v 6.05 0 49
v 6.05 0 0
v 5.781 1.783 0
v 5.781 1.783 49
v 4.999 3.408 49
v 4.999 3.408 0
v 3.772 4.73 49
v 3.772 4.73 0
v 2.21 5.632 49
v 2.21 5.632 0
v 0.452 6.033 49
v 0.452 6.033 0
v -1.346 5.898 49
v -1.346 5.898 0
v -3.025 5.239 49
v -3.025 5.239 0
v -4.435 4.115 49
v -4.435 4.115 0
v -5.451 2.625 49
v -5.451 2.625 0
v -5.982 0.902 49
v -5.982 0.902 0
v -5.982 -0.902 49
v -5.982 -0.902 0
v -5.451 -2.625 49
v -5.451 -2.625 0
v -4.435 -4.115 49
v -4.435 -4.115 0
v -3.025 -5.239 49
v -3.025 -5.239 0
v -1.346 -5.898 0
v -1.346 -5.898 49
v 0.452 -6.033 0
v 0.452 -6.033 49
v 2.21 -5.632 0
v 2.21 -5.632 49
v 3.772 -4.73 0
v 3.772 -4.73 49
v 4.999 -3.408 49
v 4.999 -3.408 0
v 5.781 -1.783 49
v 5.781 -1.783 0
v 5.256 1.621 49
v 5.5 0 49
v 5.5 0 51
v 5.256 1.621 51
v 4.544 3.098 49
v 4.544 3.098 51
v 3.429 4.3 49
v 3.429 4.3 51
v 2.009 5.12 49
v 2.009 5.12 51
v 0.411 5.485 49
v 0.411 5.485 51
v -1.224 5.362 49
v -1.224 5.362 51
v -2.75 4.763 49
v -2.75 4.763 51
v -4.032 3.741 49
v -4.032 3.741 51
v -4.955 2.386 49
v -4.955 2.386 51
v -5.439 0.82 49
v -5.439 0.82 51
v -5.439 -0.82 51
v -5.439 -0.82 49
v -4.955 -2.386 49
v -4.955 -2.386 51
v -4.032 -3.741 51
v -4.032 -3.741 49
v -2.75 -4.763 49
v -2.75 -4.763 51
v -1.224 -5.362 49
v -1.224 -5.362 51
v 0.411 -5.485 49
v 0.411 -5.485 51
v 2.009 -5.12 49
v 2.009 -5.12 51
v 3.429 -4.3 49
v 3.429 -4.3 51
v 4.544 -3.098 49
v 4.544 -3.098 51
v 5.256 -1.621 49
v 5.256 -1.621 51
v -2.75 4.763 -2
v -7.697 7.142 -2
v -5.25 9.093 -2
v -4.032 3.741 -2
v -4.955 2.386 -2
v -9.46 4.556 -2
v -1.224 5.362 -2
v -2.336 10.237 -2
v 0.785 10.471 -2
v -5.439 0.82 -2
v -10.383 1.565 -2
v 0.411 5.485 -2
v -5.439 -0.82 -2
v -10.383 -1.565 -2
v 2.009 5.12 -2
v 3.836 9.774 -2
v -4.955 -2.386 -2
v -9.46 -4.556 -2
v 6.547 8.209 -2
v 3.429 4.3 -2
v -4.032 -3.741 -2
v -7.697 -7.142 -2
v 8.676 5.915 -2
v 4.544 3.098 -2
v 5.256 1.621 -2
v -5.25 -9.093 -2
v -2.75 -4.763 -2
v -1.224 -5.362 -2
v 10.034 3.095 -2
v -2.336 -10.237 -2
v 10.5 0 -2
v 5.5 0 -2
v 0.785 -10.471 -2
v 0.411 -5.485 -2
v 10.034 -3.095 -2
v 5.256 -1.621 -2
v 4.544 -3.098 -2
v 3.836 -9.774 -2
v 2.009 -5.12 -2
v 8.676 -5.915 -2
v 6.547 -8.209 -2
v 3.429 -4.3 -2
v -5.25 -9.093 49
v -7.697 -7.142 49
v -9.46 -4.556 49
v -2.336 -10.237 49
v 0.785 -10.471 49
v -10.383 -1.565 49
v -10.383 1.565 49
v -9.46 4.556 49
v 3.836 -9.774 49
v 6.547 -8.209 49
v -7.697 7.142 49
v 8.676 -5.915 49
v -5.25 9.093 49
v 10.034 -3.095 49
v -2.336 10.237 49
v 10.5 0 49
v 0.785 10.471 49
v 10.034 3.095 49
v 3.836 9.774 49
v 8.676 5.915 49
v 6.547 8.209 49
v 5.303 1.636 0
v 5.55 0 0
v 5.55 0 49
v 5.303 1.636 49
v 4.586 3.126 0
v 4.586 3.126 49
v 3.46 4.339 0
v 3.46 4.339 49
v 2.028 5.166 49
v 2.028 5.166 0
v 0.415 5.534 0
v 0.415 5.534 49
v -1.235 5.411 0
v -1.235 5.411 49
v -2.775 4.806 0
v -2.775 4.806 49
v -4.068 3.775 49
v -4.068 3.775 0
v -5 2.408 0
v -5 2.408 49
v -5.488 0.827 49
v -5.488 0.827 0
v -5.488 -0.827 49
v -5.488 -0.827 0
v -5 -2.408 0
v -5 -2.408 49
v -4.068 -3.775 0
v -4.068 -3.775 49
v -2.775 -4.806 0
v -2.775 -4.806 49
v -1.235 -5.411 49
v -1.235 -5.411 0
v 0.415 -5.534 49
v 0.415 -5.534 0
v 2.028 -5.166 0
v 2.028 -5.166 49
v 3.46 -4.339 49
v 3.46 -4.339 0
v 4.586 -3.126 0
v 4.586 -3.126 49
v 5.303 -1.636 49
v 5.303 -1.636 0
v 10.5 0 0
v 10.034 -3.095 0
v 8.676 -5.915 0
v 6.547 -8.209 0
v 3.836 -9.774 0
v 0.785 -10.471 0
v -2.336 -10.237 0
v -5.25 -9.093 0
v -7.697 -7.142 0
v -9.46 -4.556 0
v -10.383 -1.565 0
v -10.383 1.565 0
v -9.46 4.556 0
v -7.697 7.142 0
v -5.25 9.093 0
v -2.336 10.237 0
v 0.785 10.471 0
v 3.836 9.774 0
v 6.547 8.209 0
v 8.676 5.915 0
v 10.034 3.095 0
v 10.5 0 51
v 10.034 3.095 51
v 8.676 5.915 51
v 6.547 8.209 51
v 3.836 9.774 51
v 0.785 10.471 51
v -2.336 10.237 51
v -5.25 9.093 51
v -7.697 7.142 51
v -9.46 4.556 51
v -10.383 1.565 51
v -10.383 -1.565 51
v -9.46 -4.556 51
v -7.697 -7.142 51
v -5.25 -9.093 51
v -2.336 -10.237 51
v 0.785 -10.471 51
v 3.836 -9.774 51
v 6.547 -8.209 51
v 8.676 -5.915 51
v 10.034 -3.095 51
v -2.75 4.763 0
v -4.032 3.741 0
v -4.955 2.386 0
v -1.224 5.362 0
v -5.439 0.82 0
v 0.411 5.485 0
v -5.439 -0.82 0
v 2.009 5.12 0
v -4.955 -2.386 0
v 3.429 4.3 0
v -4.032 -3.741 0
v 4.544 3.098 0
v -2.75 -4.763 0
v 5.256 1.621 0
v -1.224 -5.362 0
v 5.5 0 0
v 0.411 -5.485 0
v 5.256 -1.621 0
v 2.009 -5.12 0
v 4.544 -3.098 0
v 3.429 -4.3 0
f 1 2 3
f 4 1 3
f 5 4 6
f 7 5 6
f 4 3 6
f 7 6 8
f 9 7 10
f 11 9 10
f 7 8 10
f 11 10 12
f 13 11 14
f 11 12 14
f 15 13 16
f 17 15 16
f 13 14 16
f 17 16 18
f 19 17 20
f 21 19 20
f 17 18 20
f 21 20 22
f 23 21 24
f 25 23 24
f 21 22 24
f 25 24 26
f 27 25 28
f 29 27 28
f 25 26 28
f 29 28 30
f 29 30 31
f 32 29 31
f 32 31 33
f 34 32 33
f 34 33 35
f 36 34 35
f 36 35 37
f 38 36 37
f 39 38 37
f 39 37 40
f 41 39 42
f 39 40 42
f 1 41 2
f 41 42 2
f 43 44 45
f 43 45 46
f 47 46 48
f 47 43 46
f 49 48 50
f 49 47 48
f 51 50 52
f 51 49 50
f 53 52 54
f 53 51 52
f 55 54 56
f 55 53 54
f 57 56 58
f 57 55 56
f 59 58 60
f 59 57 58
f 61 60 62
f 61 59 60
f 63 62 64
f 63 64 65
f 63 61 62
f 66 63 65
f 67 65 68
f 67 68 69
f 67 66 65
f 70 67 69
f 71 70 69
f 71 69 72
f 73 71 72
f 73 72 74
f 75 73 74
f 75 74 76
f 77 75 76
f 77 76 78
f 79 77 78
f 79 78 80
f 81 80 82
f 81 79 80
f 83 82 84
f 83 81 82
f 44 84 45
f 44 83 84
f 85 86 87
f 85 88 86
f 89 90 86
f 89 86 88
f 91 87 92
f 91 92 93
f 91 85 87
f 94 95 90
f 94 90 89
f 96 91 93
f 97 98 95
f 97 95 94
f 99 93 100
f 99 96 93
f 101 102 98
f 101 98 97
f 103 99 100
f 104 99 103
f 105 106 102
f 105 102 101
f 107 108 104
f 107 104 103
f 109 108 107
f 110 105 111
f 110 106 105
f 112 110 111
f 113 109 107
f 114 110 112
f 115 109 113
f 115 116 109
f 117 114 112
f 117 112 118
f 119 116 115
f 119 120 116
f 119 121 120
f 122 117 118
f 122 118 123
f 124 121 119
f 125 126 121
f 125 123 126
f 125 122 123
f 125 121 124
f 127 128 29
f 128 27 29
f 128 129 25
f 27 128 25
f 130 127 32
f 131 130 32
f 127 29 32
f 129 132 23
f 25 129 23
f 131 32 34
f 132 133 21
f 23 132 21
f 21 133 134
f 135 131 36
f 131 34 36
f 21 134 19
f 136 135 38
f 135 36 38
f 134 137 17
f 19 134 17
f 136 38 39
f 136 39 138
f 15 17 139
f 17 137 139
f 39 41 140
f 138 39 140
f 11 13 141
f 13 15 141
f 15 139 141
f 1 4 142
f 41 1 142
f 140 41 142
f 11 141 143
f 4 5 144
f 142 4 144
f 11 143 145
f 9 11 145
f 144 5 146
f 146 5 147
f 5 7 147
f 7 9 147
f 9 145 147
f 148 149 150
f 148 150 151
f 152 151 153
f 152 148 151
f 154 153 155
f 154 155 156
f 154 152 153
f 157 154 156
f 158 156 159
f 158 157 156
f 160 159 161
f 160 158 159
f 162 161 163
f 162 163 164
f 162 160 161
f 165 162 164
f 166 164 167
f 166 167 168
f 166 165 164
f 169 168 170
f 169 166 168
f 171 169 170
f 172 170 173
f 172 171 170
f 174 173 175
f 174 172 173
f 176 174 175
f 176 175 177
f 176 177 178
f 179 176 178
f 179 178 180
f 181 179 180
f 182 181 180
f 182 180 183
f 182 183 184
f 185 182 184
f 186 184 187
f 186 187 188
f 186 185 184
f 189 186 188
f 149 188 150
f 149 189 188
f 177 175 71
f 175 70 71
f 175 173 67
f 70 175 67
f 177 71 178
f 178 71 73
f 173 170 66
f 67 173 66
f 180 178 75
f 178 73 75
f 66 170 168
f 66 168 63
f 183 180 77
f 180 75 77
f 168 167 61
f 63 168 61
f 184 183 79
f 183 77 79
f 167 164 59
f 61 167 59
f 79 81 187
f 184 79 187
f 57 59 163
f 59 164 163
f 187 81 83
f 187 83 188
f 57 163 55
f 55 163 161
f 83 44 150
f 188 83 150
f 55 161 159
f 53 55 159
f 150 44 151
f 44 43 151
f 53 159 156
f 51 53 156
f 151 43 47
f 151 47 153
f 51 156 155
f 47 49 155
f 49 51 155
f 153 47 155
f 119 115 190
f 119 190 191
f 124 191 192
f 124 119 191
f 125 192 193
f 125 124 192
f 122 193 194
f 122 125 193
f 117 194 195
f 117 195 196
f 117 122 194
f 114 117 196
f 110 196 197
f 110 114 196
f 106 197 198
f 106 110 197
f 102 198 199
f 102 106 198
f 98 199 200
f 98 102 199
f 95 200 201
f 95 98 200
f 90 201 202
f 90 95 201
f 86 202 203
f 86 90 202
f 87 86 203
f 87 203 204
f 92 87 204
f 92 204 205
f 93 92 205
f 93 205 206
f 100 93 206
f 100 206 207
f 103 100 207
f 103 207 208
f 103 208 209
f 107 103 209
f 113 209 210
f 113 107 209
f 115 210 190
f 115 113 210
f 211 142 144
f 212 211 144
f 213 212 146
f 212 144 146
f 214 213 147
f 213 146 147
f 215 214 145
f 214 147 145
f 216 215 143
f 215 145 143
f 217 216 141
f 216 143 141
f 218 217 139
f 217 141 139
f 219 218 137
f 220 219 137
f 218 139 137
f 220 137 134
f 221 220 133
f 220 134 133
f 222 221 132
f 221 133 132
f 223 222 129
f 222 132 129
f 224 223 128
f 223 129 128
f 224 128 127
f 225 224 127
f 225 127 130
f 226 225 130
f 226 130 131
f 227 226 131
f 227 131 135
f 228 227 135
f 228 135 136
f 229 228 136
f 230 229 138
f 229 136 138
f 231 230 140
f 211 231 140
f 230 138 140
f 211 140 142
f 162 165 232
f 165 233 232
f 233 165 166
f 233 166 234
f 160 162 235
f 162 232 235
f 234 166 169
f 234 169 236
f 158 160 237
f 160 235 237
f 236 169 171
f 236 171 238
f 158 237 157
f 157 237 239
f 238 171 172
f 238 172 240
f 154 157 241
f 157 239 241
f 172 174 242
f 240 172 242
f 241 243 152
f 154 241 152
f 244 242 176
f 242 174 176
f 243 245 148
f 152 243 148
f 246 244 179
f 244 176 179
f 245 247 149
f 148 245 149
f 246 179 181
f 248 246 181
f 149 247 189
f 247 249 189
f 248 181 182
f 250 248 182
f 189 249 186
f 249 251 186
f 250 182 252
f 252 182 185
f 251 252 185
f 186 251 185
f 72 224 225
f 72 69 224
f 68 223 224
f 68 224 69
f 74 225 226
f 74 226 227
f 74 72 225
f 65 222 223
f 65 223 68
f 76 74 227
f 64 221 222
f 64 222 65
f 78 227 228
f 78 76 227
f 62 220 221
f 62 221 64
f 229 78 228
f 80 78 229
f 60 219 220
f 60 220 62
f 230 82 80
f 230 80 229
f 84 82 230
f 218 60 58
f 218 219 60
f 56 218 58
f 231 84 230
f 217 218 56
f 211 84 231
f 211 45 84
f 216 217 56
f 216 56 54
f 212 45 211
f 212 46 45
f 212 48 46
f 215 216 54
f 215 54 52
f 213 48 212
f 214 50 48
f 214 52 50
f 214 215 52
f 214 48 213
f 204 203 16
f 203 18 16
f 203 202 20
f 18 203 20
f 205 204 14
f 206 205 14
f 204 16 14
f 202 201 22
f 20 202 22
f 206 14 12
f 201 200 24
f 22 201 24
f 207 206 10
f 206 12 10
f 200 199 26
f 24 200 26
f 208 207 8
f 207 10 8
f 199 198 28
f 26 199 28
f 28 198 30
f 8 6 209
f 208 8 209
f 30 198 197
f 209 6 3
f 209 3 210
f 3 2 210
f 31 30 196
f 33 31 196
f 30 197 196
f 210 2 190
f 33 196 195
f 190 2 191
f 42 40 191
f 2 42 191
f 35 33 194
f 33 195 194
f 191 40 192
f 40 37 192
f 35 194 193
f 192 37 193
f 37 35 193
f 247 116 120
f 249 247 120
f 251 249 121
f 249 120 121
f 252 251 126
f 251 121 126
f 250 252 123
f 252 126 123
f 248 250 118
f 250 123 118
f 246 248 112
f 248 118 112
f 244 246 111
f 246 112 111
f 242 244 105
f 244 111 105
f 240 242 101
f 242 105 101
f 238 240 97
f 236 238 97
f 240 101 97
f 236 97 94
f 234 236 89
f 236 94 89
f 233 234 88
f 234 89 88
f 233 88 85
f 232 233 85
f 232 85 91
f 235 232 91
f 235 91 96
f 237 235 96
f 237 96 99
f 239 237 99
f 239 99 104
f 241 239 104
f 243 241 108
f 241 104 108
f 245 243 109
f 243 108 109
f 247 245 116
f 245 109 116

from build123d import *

# Parameters (mm, degrees)
SKETCH1_R      = 6.05
SKETCH1_R_2    = 5.55
EXTRUDE1_DEPTH = 49
SKETCH2_R      = 10.5
SKETCH2_R_2    = 5.5
EXTRUDE3_DEPTH = 2
EXTRUDE4_START = 2
SKETCH3_R      = 10.5
SKETCH3_R_2    = 5.5
EXTRUDE4_DEPTH = 2


with BuildPart() as part:
    # Sketch1 → Extrude1 (new body)
    with BuildSketch(Plane.XY):
        Circle(SKETCH1_R)
        Circle(SKETCH1_R_2, mode=Mode.SUBTRACT)
    extrude(amount=EXTRUDE1_DEPTH)

    # Sketch2 → Extrude3 (add)
    with BuildSketch(Plane.XY.offset(49)):
        Circle(SKETCH2_R)
        Circle(SKETCH2_R_2, mode=Mode.SUBTRACT)
    extrude(amount=EXTRUDE3_DEPTH)

    # Sketch3 → Extrude4 (add)
    with BuildSketch(Plane(origin=(0, 0, 0), x_dir=(-1, 0, 0), z_dir=(0, 0, -1)).offset(EXTRUDE4_START)):
        with Locations(Location((0, 0, 0), (0, 0, 180))):
            Circle(SKETCH3_R)
        with Locations(Location((0, 0, 0), (0, 0, 180))):
            Circle(SKETCH3_R_2, mode=Mode.SUBTRACT)
    extrude(amount=-EXTRUDE4_DEPTH)


solid = part.part
